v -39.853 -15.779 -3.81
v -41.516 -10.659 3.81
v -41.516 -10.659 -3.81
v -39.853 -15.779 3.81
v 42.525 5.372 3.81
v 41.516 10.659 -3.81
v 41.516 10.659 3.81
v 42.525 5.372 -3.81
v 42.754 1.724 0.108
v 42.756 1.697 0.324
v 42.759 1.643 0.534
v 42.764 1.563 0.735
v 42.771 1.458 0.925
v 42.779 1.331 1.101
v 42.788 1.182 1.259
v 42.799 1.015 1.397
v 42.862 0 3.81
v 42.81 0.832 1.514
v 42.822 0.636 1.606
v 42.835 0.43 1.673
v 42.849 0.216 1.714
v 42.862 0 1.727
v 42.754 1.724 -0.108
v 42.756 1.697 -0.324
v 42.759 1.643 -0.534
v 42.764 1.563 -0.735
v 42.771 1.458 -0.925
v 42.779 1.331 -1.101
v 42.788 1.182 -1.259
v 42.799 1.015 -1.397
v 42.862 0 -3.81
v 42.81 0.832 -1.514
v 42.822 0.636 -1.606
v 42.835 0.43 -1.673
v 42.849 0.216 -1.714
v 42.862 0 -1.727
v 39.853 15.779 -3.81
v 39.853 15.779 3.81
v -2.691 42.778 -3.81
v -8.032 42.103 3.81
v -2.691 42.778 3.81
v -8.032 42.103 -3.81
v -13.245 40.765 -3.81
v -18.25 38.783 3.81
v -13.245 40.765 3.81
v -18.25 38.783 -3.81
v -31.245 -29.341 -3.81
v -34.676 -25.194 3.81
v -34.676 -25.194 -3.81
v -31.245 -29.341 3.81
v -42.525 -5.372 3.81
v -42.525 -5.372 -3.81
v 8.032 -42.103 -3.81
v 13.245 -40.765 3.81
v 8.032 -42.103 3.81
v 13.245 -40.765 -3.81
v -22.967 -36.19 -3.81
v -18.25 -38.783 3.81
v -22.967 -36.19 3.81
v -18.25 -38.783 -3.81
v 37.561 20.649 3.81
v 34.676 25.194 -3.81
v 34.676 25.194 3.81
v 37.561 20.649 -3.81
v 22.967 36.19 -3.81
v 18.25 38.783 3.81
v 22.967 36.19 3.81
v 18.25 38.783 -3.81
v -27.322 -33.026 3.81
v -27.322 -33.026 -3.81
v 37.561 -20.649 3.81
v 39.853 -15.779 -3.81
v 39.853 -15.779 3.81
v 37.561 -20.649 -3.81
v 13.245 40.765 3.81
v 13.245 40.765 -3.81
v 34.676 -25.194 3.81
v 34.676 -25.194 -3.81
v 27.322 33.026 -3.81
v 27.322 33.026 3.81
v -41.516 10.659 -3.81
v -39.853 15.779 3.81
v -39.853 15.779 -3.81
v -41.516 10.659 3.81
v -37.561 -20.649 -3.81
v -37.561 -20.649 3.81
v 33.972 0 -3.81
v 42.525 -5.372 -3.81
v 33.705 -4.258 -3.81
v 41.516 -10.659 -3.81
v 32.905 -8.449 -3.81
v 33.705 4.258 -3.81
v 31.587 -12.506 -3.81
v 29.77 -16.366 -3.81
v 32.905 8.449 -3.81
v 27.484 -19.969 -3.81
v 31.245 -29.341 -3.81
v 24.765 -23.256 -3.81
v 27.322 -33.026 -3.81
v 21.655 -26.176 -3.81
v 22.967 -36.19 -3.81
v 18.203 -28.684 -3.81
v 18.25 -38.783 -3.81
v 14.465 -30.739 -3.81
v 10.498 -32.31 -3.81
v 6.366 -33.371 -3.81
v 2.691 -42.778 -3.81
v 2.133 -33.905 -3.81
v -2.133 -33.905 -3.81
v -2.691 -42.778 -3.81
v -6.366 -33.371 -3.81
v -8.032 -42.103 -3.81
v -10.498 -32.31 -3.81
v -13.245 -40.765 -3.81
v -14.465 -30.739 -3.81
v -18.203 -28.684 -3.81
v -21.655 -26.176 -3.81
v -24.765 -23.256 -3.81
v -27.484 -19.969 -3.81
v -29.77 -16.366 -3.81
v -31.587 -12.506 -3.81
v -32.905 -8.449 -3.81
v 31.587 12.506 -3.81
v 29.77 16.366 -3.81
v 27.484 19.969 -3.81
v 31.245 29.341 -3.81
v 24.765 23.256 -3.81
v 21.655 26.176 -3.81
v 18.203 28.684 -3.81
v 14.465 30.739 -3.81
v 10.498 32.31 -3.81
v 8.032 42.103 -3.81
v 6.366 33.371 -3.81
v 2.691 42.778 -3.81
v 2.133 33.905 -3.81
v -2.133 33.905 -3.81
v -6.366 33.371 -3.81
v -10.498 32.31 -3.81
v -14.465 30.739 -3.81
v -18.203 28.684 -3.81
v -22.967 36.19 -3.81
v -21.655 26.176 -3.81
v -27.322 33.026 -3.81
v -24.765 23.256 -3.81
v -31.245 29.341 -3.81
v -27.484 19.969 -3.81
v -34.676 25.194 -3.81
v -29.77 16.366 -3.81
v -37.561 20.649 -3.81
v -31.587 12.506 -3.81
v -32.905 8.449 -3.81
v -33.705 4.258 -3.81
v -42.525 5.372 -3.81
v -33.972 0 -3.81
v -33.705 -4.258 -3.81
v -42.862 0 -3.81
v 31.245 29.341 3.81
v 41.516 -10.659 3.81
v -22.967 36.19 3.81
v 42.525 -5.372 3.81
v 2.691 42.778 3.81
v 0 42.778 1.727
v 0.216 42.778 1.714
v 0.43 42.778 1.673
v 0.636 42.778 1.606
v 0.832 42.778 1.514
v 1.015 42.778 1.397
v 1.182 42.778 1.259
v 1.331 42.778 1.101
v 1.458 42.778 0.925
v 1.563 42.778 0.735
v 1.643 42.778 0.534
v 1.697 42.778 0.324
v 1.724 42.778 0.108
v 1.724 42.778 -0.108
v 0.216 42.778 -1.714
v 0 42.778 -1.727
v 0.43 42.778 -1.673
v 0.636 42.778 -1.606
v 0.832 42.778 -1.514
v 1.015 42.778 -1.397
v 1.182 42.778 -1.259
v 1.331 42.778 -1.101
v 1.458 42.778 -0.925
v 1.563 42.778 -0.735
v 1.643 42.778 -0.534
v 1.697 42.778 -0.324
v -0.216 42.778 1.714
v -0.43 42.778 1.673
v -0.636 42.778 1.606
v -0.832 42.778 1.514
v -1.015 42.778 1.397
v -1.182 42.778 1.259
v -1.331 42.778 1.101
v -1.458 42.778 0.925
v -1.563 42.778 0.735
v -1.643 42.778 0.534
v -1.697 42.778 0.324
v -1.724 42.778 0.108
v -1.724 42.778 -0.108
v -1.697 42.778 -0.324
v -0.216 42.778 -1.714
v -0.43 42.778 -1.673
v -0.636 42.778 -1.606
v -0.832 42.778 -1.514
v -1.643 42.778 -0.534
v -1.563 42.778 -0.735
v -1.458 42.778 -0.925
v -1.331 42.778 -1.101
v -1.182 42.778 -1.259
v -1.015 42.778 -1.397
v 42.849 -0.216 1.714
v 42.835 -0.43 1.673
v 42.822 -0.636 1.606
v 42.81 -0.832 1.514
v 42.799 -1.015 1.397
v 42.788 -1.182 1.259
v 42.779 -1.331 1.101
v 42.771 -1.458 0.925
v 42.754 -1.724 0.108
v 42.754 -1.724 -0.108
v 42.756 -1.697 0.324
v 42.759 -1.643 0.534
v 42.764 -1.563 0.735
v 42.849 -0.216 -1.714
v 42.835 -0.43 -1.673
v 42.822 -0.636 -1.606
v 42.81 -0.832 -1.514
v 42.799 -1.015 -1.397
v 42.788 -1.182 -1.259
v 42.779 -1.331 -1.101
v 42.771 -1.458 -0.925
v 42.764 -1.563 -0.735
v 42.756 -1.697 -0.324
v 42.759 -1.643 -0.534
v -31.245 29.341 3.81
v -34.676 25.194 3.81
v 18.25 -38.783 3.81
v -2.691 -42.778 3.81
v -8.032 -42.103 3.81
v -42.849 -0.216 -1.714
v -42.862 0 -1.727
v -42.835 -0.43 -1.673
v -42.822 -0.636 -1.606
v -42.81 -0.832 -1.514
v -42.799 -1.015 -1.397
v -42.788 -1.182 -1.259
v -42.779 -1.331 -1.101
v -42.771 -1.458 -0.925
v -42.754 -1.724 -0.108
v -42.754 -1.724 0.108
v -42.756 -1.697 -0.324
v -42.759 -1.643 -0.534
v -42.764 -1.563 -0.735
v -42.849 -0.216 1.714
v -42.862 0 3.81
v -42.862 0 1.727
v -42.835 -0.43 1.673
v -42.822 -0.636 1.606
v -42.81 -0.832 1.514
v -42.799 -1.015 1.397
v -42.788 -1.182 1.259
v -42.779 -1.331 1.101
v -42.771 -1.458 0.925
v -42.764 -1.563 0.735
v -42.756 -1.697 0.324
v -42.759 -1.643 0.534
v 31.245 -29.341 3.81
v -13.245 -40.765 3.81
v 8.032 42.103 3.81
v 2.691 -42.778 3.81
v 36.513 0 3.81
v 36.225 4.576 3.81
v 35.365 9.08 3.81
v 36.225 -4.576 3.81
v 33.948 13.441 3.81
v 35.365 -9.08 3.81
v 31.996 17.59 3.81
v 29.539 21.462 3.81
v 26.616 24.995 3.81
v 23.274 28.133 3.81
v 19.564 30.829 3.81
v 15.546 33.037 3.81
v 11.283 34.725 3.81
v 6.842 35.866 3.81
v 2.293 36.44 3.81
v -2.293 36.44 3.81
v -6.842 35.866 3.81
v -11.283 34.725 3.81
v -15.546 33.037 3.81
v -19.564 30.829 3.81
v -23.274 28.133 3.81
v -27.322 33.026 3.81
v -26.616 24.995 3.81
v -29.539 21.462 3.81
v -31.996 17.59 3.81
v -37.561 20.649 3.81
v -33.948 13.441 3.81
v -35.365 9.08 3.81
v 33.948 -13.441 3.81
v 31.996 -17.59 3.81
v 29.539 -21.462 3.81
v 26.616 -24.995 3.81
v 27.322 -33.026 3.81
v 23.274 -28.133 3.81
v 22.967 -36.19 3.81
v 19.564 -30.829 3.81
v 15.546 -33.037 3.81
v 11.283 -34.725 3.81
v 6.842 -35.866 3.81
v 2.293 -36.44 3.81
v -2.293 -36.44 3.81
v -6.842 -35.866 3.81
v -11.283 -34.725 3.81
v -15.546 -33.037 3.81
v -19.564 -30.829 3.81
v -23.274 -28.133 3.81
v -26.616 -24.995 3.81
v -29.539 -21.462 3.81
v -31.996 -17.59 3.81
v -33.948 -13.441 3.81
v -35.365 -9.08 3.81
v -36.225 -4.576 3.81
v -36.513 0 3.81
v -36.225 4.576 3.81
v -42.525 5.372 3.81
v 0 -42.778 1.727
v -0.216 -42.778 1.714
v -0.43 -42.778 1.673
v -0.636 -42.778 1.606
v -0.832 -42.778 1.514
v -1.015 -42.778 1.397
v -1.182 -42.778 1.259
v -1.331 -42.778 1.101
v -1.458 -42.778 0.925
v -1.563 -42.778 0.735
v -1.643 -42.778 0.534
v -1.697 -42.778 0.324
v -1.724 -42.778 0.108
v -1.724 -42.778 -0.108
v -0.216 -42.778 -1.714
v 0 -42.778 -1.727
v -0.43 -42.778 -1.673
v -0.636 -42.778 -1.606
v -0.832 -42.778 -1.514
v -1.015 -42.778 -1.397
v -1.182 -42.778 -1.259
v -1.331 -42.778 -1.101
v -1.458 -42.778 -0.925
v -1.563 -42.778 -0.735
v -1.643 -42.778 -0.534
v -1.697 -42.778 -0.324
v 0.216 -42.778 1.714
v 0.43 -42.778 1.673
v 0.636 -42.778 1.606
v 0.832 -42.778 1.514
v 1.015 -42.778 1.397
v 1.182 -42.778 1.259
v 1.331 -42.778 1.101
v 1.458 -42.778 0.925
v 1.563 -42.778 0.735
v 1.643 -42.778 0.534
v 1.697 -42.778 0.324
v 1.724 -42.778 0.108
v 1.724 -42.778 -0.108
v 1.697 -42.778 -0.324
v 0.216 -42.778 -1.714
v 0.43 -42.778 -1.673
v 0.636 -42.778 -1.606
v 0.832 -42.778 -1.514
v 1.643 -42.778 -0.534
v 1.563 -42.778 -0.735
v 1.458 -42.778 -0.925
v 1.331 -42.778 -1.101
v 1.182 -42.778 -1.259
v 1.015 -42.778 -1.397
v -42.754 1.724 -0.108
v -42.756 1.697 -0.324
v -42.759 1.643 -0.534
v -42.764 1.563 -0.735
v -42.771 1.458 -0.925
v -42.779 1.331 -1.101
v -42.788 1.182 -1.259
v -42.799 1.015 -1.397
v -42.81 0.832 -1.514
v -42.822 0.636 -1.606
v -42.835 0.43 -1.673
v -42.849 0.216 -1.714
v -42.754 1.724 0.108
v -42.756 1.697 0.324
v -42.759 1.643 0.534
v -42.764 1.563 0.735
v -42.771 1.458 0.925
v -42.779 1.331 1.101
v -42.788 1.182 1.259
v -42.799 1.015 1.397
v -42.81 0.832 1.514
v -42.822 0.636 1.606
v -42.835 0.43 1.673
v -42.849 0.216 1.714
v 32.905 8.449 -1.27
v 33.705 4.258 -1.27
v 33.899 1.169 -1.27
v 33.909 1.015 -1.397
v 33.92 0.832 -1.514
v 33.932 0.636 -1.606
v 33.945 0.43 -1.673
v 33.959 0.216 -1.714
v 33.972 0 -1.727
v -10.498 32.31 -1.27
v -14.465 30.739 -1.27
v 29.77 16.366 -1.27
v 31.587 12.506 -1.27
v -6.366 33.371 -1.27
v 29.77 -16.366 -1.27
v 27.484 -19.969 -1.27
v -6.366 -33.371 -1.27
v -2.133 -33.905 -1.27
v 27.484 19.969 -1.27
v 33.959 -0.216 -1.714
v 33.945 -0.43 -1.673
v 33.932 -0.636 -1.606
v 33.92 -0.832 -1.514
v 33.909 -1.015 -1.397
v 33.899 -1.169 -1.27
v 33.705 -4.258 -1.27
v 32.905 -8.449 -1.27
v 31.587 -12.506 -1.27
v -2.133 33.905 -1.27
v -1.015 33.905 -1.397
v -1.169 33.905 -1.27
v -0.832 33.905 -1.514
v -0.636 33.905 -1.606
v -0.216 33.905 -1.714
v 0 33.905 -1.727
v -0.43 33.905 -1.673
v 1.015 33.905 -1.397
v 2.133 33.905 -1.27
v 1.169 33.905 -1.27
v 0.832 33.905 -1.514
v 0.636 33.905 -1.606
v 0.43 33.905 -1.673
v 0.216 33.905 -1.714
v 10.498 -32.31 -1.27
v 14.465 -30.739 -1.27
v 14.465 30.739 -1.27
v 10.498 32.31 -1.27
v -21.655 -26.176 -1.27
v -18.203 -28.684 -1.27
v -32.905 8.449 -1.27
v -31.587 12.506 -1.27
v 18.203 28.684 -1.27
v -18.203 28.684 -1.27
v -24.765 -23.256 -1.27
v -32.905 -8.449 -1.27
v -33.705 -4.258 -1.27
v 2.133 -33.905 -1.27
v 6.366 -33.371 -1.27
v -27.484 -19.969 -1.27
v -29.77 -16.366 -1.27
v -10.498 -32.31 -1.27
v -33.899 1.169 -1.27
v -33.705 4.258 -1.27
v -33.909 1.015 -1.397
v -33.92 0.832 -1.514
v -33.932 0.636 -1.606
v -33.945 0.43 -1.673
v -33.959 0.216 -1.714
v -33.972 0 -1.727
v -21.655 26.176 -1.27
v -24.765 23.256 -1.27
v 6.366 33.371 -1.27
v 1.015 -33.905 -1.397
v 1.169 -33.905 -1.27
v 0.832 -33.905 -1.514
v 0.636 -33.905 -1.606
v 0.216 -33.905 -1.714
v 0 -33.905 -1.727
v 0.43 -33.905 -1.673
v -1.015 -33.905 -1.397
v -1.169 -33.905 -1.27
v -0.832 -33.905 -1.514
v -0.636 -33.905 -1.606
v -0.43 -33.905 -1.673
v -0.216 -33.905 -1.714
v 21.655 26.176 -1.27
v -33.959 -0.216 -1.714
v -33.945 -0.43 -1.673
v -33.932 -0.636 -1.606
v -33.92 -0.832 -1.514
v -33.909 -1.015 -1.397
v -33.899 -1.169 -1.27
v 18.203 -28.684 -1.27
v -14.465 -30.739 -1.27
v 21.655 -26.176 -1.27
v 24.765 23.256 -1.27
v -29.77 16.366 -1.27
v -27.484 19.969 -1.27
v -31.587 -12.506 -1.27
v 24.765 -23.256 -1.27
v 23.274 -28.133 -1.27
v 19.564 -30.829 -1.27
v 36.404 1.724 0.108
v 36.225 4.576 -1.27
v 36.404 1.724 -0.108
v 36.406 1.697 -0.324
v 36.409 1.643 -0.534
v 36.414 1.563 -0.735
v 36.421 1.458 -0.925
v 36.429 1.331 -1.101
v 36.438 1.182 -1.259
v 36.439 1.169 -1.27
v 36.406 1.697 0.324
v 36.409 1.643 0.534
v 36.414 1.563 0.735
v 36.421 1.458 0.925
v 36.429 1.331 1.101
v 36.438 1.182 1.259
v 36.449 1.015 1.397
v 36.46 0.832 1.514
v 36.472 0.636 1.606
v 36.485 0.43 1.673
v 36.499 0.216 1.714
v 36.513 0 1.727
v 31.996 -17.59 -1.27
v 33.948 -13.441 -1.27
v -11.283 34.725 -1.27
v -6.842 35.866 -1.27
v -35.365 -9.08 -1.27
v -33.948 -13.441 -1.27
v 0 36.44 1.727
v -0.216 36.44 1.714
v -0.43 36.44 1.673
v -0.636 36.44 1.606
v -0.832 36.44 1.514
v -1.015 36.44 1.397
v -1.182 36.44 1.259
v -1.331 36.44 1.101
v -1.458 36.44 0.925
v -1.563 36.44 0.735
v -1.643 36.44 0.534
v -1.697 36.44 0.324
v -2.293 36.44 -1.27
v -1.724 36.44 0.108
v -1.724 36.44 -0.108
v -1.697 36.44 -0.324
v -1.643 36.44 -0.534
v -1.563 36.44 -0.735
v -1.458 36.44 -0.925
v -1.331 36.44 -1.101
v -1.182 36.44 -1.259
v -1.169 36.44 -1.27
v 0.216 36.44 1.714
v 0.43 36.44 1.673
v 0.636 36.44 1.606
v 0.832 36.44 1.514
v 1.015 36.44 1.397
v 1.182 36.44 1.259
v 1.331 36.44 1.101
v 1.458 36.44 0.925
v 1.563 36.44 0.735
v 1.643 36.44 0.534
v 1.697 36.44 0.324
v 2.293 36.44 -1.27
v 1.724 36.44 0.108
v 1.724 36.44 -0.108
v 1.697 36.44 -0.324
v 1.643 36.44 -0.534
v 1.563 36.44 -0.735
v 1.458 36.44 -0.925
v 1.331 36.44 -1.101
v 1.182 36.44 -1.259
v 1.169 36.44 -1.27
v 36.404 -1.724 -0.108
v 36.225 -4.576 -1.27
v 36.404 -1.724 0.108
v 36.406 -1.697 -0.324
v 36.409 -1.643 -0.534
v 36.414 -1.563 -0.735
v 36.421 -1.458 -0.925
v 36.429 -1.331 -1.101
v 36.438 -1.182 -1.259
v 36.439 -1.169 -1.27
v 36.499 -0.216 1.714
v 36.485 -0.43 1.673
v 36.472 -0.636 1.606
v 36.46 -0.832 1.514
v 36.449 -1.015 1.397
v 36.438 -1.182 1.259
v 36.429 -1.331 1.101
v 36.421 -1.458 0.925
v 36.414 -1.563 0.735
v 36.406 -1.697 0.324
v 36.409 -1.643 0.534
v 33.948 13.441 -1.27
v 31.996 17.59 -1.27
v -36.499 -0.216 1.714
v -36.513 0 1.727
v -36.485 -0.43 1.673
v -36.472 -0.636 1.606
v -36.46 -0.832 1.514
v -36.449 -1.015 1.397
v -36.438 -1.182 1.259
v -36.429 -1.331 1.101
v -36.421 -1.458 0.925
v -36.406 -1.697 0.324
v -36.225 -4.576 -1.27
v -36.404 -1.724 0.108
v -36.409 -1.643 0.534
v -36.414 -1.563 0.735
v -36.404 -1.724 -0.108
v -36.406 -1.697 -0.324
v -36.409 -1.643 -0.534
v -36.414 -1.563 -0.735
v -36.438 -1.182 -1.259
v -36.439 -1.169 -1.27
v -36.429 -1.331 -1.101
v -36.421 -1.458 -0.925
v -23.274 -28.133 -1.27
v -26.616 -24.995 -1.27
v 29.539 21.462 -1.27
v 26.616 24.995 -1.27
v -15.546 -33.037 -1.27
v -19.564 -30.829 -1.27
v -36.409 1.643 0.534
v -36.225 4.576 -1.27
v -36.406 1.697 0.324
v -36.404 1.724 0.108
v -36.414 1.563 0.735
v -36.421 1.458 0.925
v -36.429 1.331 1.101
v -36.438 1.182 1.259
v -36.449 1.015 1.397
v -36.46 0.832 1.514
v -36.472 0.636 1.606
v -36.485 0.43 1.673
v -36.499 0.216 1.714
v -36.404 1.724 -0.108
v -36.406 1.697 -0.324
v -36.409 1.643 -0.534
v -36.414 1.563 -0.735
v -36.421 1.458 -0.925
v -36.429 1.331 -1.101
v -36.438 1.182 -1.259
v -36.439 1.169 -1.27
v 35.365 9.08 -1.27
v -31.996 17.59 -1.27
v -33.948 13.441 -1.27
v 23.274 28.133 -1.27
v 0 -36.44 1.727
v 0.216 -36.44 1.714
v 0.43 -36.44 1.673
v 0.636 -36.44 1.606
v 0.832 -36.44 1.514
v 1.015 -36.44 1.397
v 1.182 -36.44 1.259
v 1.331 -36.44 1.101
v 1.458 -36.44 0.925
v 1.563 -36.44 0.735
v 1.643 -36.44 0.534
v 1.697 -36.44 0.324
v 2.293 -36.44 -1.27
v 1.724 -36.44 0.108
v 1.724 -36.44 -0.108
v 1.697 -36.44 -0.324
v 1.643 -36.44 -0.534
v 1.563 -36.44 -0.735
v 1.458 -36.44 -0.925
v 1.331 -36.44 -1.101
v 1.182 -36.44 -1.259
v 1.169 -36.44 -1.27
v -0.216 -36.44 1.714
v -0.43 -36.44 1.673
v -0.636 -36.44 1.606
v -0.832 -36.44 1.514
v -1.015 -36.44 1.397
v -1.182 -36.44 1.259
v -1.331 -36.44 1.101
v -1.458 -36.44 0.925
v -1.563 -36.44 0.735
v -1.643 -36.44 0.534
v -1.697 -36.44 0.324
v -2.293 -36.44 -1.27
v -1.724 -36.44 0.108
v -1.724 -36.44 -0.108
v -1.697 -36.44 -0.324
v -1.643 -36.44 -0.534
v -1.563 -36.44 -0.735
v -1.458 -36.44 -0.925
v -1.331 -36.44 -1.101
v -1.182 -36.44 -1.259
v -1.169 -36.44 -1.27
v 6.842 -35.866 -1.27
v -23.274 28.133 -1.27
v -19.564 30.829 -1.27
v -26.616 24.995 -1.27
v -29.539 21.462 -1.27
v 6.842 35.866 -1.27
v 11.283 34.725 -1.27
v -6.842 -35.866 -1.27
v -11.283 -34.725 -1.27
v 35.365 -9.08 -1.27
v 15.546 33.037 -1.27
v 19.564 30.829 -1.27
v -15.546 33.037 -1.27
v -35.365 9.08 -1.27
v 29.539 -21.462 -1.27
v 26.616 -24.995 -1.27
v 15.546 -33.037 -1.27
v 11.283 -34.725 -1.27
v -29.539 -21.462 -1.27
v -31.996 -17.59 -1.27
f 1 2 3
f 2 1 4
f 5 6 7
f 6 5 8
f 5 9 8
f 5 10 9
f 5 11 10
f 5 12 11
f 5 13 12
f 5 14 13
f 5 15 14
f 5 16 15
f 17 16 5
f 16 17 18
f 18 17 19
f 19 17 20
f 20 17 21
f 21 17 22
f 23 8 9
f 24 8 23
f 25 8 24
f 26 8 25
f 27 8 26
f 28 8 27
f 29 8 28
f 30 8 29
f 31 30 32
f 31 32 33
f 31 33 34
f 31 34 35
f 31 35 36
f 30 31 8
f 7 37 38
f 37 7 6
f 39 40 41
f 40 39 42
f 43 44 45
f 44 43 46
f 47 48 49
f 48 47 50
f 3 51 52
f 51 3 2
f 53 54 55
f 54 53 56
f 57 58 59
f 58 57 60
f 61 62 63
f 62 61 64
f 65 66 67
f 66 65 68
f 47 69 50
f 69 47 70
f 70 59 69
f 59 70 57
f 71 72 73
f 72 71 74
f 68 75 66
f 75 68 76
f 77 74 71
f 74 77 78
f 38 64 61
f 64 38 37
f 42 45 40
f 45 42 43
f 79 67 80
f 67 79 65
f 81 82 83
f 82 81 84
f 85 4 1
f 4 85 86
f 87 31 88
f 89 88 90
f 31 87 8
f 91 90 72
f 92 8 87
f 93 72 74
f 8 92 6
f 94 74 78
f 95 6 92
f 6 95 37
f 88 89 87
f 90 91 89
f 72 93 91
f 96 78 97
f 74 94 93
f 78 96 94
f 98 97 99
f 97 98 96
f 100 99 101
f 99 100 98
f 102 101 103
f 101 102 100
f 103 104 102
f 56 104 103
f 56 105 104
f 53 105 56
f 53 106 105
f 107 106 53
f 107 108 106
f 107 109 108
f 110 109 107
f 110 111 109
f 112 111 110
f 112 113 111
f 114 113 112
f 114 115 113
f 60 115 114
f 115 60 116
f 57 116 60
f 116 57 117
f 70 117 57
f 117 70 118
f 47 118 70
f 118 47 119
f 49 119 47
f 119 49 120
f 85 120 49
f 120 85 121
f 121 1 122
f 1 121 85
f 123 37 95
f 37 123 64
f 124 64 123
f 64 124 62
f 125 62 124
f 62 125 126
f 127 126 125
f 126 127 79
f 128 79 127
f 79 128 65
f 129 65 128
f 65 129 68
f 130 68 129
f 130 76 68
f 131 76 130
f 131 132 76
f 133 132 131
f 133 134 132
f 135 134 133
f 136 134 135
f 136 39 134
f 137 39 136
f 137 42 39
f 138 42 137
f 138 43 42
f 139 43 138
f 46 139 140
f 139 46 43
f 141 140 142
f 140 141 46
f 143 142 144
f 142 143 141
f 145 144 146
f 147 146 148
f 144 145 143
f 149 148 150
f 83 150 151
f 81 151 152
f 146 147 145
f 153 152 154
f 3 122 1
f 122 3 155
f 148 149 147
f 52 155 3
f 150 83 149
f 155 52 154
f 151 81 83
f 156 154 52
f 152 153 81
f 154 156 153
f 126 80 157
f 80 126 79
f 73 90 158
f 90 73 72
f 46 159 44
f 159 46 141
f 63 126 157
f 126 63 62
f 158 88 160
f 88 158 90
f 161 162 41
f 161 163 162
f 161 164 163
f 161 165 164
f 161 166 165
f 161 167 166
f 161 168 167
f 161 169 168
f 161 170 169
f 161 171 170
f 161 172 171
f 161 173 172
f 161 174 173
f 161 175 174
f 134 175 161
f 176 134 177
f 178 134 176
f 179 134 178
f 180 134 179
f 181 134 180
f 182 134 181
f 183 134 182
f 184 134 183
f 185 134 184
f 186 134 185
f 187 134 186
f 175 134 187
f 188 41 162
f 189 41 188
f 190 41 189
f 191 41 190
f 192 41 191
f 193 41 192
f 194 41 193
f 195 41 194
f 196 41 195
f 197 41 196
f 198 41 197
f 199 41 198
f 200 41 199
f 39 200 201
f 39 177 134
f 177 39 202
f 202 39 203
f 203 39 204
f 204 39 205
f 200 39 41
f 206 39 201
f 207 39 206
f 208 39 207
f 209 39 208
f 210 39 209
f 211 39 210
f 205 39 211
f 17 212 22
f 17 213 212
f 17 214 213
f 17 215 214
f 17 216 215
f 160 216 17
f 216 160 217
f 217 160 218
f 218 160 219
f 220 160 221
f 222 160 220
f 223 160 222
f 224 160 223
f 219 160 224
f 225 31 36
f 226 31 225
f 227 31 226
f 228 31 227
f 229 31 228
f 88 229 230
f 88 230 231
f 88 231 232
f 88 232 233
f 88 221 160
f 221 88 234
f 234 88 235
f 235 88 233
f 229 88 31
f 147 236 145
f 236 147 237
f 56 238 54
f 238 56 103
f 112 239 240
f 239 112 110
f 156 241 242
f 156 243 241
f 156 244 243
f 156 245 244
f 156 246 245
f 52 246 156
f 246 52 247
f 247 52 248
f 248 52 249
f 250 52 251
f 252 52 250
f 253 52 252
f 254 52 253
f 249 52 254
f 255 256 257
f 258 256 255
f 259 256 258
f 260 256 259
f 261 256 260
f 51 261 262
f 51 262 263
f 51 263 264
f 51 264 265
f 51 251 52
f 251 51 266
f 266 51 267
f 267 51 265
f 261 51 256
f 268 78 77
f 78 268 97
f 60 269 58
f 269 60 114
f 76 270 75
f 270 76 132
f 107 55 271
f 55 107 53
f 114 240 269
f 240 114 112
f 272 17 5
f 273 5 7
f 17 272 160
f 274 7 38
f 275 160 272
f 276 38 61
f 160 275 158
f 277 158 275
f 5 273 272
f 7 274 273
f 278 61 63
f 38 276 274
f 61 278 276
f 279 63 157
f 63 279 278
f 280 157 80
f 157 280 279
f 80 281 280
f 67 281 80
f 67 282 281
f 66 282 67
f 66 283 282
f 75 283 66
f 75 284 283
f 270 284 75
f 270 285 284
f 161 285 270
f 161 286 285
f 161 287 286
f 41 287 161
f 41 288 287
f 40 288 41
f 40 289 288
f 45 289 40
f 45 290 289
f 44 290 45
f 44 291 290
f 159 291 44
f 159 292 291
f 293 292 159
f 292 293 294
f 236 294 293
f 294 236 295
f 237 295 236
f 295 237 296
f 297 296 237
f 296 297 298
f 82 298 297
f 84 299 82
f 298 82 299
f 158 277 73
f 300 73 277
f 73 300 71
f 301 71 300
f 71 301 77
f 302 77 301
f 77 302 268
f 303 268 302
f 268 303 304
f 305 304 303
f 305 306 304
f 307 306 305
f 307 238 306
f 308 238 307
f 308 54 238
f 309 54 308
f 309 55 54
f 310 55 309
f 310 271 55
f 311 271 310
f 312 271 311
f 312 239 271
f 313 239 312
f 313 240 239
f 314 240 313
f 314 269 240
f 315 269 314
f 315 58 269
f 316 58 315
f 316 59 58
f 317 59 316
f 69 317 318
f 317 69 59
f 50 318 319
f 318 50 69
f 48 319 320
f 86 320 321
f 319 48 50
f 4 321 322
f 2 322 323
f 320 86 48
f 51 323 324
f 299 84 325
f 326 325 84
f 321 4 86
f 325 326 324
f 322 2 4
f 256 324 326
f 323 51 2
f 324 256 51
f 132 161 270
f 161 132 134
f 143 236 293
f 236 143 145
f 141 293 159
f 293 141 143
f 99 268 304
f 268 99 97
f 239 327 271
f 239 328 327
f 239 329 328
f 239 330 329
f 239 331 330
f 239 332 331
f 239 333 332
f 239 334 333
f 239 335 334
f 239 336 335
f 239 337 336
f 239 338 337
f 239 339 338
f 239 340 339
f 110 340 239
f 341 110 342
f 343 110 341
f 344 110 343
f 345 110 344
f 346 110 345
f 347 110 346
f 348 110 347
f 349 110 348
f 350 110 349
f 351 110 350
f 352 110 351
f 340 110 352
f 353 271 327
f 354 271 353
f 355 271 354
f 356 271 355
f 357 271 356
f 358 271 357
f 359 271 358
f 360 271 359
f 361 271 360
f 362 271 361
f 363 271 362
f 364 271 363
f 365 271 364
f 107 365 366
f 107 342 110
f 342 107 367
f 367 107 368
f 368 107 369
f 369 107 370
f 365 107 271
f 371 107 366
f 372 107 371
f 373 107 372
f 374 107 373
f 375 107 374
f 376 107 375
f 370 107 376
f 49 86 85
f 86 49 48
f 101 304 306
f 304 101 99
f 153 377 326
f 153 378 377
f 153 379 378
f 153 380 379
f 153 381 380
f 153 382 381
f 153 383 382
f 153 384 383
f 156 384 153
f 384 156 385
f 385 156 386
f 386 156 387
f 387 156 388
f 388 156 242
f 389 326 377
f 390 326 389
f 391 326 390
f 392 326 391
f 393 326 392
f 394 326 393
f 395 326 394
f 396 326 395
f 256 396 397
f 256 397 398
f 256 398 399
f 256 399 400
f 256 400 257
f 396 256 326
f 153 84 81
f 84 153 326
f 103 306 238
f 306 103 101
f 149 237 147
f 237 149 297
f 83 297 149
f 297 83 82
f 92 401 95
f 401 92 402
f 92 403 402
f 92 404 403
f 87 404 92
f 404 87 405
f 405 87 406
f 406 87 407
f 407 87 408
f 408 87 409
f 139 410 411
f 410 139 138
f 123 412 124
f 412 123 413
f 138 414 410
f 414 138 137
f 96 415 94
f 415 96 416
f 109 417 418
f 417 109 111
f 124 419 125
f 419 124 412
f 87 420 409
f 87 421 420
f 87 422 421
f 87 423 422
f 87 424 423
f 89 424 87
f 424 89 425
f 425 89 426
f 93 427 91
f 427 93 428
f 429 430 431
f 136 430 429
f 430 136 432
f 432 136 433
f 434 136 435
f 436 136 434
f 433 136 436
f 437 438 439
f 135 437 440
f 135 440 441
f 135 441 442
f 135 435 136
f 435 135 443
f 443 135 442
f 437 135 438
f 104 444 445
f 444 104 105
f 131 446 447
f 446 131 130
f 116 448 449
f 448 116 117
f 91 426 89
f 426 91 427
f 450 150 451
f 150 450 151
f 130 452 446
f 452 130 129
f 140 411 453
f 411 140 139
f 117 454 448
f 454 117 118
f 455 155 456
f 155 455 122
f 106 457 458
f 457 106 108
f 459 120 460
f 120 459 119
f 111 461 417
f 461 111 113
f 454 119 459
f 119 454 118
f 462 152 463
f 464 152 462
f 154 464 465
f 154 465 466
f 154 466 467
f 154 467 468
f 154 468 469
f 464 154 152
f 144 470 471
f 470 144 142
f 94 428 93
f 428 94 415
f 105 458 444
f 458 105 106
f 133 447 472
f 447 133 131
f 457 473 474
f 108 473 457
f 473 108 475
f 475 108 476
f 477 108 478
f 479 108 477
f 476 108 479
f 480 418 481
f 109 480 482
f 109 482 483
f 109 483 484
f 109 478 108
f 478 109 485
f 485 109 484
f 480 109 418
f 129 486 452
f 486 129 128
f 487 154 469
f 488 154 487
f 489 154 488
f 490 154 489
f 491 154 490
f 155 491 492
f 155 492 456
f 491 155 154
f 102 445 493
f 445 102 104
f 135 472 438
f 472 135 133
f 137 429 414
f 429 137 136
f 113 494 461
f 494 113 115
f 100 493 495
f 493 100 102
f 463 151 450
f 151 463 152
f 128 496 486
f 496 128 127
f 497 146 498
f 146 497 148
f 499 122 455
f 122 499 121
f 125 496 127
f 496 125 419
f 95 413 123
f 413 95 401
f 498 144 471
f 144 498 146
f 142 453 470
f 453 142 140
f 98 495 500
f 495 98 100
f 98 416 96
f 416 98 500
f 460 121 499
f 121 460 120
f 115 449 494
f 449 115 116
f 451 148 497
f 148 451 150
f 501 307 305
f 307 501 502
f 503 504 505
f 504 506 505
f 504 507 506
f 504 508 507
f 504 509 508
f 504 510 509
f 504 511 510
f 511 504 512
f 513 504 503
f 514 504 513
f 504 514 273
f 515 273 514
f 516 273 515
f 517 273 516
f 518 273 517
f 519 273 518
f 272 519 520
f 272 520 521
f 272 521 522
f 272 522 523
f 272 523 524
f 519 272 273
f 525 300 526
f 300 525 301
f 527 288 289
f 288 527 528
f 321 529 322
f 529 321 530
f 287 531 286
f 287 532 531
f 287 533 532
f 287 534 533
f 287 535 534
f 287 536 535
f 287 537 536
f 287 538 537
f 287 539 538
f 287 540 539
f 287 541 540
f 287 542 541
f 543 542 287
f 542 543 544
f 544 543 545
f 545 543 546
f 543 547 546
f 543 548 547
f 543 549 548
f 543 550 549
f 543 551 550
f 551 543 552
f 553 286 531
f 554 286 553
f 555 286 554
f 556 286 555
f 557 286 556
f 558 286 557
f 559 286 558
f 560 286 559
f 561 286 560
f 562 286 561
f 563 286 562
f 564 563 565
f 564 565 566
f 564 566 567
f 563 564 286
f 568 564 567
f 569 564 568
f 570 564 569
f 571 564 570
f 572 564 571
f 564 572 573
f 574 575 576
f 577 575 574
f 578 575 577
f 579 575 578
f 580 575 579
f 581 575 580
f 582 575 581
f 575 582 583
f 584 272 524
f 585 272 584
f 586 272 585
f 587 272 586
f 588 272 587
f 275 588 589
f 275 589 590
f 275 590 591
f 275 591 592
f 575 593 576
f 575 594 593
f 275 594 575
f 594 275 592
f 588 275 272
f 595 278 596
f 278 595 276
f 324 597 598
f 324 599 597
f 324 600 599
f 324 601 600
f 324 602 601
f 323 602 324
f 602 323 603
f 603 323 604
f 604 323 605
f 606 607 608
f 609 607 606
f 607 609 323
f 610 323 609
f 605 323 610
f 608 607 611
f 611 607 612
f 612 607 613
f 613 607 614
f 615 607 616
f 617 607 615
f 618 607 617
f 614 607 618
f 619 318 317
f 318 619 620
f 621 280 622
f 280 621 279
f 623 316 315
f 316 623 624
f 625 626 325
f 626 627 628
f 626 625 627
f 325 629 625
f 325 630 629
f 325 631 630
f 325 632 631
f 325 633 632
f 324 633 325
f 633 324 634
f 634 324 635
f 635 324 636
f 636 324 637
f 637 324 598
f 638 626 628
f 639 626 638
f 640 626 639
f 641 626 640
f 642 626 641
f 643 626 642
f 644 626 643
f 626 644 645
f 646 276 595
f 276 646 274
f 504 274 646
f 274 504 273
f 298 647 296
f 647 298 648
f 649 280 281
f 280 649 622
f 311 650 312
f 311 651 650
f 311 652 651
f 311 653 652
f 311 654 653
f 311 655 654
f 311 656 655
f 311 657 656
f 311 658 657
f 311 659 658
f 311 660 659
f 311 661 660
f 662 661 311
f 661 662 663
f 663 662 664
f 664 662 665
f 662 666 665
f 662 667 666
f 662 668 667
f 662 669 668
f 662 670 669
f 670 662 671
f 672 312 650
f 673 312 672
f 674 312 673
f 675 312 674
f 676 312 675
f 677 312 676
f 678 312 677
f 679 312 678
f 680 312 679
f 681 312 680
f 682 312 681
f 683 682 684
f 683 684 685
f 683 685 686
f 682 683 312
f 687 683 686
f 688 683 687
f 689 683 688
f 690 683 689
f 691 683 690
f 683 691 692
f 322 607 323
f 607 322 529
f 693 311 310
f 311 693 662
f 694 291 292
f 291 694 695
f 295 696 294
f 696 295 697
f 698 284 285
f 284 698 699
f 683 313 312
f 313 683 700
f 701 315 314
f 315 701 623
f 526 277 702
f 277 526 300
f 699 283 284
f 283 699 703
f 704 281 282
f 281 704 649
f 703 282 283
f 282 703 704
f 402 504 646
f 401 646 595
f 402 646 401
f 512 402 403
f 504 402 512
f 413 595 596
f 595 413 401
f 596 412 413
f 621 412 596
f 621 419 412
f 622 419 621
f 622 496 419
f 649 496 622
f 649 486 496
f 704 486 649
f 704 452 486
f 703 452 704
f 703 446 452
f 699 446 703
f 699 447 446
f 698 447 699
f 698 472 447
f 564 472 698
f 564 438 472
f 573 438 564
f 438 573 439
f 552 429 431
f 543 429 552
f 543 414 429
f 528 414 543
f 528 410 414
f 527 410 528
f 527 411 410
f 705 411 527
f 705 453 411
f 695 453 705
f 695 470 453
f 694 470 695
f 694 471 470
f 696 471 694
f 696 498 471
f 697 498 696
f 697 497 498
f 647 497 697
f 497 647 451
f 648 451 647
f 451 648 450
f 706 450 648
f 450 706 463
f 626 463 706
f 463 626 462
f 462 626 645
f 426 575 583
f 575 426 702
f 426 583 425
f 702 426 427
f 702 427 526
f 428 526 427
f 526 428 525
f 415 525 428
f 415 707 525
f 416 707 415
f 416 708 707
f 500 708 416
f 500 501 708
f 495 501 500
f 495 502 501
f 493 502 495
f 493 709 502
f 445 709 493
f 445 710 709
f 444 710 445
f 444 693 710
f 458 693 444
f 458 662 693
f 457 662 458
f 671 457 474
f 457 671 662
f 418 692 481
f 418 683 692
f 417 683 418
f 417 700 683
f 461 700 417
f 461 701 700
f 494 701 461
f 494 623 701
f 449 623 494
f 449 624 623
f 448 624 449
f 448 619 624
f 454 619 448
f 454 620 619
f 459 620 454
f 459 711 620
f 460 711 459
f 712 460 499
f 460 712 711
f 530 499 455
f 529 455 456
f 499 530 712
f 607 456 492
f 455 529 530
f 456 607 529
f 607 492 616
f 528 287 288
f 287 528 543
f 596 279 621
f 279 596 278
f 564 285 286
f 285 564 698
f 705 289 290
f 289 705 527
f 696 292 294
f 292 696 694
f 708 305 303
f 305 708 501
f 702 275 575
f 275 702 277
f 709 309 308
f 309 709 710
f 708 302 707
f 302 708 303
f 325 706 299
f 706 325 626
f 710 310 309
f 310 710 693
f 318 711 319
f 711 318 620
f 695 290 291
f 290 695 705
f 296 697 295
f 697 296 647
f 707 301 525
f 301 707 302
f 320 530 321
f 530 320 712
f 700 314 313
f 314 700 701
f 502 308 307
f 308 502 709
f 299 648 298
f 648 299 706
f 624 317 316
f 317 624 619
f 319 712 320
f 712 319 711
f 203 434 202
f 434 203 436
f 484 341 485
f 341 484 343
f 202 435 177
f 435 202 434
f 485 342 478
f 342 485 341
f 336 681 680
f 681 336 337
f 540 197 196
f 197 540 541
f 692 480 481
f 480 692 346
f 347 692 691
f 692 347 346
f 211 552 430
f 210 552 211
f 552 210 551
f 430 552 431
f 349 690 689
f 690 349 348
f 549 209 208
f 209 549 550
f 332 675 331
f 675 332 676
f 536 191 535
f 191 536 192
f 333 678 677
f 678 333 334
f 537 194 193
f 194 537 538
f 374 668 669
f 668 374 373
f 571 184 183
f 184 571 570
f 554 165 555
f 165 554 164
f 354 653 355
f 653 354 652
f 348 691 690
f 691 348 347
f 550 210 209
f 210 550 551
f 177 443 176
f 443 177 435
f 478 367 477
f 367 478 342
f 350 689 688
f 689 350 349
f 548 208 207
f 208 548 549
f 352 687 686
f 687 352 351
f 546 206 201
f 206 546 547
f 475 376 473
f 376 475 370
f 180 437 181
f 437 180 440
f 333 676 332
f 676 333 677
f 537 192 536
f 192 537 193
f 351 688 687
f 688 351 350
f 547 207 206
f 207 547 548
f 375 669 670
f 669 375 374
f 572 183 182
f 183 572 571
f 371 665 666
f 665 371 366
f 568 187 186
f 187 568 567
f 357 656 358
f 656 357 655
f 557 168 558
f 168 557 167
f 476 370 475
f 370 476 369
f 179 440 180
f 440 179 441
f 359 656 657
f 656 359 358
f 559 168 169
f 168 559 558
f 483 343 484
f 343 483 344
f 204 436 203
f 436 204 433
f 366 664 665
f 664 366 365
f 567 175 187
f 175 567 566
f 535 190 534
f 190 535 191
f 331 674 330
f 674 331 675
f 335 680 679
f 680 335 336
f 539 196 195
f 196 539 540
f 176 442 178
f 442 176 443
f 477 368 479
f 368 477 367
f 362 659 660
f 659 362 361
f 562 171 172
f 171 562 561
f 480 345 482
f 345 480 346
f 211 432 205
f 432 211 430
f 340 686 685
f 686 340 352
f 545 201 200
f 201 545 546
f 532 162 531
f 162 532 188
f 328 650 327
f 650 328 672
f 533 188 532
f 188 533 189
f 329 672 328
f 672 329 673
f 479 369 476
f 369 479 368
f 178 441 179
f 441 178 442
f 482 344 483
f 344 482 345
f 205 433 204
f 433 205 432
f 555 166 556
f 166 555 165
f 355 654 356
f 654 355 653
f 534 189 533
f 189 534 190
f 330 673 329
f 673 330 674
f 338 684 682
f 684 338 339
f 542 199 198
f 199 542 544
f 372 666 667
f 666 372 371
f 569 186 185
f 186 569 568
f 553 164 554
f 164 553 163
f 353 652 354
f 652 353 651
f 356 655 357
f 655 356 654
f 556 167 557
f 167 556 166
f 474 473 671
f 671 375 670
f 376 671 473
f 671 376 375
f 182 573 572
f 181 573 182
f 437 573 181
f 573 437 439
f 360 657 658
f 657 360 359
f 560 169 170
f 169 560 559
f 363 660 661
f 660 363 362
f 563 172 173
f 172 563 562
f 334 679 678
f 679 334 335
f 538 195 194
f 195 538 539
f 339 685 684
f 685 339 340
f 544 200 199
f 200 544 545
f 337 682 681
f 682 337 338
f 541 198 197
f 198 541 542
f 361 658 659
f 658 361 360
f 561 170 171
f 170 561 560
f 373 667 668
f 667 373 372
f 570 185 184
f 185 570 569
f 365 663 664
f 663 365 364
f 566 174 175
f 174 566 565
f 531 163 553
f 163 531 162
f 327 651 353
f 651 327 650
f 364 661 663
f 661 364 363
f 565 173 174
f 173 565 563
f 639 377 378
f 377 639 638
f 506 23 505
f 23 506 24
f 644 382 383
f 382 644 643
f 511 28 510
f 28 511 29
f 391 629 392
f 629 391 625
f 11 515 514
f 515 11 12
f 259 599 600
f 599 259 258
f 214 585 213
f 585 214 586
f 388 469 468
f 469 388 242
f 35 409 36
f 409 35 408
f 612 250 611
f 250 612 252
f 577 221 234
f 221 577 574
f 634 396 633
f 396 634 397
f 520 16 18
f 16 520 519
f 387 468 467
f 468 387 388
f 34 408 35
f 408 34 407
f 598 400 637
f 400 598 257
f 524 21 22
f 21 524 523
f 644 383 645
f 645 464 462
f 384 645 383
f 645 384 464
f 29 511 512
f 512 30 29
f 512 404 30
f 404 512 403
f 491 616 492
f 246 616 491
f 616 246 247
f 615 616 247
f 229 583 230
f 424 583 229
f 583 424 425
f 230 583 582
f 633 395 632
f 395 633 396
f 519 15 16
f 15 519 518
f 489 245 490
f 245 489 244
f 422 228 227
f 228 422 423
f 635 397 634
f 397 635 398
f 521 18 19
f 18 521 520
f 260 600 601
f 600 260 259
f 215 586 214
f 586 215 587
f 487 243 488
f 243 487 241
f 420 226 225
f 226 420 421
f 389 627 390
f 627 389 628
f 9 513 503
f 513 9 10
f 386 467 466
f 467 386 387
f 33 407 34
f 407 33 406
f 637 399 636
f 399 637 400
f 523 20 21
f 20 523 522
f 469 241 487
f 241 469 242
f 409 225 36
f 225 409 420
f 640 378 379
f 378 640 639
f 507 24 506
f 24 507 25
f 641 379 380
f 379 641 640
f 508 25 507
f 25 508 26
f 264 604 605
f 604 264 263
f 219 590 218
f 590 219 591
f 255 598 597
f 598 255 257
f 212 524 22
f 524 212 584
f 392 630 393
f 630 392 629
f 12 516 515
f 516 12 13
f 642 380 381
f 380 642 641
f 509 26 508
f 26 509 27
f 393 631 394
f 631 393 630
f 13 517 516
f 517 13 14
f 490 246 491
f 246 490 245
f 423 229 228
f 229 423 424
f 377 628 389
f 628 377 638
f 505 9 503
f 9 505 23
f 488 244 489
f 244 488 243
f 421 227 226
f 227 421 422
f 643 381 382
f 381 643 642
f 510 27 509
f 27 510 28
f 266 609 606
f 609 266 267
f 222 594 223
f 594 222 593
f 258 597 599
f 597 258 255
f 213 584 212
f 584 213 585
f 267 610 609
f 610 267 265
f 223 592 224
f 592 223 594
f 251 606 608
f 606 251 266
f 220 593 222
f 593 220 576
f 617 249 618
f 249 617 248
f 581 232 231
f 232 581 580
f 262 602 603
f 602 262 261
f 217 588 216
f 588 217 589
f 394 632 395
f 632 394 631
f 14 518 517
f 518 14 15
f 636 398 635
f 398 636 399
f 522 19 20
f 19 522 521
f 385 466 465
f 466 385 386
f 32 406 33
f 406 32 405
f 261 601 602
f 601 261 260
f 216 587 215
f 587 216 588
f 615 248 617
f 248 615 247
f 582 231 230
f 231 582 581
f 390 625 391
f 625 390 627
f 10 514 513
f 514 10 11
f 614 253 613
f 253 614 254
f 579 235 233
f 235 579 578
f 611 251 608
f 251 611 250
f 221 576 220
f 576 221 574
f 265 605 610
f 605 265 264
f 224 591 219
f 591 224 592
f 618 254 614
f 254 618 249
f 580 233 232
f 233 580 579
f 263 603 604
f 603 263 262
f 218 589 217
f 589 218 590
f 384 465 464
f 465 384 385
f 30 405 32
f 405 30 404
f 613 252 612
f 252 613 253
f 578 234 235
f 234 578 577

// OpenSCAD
$fn = 50;
//$fa = 0.01;
//$fs = 0.5;


in=25.4;
l=1.5*in;
lSide=1.75*in;
w=l;
h=0.3*in;
d=1*in;

dHole=2.875*in;
dLip=dHole-0.2*in;
dOuter=dHole+0.5*in;

d8=0.136*in;
p=0.125*in;

render(convexity=3)
{

	union()
	{
			

		difference()
		{
		cylinder(h=h, r1=dOuter/2, r2=dOuter/2,center=true); //Body 
		cylinder(h=10*in, r1=dLip/2, r2=dLip/2,center=true); //Body
		translate([0,0,0.1*in]) cylinder(h=h, r1=dHole/2, r2=dHole/2,center=true); //Body
		//translate([0,0,-h*0.275]) cylinder(h=100, r=dHole/2); //Hole
//		translate([0,0,-10]) cylinder(h=100, r=dLip/2); //Lip diameter
//
		rotate([0,90,90]) translate([0,0,1.0*d/2]) cylinder(h=10*d, r=d8/2, center=true); //Edge screw hole

		rotate([0,-90,0]) translate([0,0,1.0*d/2]) cylinder(h=1000*d, r=d8/2, center=true); //Edge screw hole
//		rotate([90,0,0]) translate([0,0,1.0*d/2]) cylinder(h=d, r=d8/2, center=false); //Edge screw hole
//		rotate([-90,0,0]) translate([0,0,1.0*d/2]) cylinder(h=d, r=d8/2, center=false); //Edge screw hole
//
//
//		//rotate([90,0,0]) cylinder(h=2*d, r=d8/2, center=true);
//		
//		translate([15,15,0]) cylinder(h=100, r=3, center=true);
//		translate([15,-15,0]) cylinder(h=100, r=3, center=true);
//		translate([-15,15,0]) cylinder(h=100, r=3, center=true);
//		translate([-15,-15,0]) cylinder(h=100, r=3, center=true);


		}
	

	}

}
